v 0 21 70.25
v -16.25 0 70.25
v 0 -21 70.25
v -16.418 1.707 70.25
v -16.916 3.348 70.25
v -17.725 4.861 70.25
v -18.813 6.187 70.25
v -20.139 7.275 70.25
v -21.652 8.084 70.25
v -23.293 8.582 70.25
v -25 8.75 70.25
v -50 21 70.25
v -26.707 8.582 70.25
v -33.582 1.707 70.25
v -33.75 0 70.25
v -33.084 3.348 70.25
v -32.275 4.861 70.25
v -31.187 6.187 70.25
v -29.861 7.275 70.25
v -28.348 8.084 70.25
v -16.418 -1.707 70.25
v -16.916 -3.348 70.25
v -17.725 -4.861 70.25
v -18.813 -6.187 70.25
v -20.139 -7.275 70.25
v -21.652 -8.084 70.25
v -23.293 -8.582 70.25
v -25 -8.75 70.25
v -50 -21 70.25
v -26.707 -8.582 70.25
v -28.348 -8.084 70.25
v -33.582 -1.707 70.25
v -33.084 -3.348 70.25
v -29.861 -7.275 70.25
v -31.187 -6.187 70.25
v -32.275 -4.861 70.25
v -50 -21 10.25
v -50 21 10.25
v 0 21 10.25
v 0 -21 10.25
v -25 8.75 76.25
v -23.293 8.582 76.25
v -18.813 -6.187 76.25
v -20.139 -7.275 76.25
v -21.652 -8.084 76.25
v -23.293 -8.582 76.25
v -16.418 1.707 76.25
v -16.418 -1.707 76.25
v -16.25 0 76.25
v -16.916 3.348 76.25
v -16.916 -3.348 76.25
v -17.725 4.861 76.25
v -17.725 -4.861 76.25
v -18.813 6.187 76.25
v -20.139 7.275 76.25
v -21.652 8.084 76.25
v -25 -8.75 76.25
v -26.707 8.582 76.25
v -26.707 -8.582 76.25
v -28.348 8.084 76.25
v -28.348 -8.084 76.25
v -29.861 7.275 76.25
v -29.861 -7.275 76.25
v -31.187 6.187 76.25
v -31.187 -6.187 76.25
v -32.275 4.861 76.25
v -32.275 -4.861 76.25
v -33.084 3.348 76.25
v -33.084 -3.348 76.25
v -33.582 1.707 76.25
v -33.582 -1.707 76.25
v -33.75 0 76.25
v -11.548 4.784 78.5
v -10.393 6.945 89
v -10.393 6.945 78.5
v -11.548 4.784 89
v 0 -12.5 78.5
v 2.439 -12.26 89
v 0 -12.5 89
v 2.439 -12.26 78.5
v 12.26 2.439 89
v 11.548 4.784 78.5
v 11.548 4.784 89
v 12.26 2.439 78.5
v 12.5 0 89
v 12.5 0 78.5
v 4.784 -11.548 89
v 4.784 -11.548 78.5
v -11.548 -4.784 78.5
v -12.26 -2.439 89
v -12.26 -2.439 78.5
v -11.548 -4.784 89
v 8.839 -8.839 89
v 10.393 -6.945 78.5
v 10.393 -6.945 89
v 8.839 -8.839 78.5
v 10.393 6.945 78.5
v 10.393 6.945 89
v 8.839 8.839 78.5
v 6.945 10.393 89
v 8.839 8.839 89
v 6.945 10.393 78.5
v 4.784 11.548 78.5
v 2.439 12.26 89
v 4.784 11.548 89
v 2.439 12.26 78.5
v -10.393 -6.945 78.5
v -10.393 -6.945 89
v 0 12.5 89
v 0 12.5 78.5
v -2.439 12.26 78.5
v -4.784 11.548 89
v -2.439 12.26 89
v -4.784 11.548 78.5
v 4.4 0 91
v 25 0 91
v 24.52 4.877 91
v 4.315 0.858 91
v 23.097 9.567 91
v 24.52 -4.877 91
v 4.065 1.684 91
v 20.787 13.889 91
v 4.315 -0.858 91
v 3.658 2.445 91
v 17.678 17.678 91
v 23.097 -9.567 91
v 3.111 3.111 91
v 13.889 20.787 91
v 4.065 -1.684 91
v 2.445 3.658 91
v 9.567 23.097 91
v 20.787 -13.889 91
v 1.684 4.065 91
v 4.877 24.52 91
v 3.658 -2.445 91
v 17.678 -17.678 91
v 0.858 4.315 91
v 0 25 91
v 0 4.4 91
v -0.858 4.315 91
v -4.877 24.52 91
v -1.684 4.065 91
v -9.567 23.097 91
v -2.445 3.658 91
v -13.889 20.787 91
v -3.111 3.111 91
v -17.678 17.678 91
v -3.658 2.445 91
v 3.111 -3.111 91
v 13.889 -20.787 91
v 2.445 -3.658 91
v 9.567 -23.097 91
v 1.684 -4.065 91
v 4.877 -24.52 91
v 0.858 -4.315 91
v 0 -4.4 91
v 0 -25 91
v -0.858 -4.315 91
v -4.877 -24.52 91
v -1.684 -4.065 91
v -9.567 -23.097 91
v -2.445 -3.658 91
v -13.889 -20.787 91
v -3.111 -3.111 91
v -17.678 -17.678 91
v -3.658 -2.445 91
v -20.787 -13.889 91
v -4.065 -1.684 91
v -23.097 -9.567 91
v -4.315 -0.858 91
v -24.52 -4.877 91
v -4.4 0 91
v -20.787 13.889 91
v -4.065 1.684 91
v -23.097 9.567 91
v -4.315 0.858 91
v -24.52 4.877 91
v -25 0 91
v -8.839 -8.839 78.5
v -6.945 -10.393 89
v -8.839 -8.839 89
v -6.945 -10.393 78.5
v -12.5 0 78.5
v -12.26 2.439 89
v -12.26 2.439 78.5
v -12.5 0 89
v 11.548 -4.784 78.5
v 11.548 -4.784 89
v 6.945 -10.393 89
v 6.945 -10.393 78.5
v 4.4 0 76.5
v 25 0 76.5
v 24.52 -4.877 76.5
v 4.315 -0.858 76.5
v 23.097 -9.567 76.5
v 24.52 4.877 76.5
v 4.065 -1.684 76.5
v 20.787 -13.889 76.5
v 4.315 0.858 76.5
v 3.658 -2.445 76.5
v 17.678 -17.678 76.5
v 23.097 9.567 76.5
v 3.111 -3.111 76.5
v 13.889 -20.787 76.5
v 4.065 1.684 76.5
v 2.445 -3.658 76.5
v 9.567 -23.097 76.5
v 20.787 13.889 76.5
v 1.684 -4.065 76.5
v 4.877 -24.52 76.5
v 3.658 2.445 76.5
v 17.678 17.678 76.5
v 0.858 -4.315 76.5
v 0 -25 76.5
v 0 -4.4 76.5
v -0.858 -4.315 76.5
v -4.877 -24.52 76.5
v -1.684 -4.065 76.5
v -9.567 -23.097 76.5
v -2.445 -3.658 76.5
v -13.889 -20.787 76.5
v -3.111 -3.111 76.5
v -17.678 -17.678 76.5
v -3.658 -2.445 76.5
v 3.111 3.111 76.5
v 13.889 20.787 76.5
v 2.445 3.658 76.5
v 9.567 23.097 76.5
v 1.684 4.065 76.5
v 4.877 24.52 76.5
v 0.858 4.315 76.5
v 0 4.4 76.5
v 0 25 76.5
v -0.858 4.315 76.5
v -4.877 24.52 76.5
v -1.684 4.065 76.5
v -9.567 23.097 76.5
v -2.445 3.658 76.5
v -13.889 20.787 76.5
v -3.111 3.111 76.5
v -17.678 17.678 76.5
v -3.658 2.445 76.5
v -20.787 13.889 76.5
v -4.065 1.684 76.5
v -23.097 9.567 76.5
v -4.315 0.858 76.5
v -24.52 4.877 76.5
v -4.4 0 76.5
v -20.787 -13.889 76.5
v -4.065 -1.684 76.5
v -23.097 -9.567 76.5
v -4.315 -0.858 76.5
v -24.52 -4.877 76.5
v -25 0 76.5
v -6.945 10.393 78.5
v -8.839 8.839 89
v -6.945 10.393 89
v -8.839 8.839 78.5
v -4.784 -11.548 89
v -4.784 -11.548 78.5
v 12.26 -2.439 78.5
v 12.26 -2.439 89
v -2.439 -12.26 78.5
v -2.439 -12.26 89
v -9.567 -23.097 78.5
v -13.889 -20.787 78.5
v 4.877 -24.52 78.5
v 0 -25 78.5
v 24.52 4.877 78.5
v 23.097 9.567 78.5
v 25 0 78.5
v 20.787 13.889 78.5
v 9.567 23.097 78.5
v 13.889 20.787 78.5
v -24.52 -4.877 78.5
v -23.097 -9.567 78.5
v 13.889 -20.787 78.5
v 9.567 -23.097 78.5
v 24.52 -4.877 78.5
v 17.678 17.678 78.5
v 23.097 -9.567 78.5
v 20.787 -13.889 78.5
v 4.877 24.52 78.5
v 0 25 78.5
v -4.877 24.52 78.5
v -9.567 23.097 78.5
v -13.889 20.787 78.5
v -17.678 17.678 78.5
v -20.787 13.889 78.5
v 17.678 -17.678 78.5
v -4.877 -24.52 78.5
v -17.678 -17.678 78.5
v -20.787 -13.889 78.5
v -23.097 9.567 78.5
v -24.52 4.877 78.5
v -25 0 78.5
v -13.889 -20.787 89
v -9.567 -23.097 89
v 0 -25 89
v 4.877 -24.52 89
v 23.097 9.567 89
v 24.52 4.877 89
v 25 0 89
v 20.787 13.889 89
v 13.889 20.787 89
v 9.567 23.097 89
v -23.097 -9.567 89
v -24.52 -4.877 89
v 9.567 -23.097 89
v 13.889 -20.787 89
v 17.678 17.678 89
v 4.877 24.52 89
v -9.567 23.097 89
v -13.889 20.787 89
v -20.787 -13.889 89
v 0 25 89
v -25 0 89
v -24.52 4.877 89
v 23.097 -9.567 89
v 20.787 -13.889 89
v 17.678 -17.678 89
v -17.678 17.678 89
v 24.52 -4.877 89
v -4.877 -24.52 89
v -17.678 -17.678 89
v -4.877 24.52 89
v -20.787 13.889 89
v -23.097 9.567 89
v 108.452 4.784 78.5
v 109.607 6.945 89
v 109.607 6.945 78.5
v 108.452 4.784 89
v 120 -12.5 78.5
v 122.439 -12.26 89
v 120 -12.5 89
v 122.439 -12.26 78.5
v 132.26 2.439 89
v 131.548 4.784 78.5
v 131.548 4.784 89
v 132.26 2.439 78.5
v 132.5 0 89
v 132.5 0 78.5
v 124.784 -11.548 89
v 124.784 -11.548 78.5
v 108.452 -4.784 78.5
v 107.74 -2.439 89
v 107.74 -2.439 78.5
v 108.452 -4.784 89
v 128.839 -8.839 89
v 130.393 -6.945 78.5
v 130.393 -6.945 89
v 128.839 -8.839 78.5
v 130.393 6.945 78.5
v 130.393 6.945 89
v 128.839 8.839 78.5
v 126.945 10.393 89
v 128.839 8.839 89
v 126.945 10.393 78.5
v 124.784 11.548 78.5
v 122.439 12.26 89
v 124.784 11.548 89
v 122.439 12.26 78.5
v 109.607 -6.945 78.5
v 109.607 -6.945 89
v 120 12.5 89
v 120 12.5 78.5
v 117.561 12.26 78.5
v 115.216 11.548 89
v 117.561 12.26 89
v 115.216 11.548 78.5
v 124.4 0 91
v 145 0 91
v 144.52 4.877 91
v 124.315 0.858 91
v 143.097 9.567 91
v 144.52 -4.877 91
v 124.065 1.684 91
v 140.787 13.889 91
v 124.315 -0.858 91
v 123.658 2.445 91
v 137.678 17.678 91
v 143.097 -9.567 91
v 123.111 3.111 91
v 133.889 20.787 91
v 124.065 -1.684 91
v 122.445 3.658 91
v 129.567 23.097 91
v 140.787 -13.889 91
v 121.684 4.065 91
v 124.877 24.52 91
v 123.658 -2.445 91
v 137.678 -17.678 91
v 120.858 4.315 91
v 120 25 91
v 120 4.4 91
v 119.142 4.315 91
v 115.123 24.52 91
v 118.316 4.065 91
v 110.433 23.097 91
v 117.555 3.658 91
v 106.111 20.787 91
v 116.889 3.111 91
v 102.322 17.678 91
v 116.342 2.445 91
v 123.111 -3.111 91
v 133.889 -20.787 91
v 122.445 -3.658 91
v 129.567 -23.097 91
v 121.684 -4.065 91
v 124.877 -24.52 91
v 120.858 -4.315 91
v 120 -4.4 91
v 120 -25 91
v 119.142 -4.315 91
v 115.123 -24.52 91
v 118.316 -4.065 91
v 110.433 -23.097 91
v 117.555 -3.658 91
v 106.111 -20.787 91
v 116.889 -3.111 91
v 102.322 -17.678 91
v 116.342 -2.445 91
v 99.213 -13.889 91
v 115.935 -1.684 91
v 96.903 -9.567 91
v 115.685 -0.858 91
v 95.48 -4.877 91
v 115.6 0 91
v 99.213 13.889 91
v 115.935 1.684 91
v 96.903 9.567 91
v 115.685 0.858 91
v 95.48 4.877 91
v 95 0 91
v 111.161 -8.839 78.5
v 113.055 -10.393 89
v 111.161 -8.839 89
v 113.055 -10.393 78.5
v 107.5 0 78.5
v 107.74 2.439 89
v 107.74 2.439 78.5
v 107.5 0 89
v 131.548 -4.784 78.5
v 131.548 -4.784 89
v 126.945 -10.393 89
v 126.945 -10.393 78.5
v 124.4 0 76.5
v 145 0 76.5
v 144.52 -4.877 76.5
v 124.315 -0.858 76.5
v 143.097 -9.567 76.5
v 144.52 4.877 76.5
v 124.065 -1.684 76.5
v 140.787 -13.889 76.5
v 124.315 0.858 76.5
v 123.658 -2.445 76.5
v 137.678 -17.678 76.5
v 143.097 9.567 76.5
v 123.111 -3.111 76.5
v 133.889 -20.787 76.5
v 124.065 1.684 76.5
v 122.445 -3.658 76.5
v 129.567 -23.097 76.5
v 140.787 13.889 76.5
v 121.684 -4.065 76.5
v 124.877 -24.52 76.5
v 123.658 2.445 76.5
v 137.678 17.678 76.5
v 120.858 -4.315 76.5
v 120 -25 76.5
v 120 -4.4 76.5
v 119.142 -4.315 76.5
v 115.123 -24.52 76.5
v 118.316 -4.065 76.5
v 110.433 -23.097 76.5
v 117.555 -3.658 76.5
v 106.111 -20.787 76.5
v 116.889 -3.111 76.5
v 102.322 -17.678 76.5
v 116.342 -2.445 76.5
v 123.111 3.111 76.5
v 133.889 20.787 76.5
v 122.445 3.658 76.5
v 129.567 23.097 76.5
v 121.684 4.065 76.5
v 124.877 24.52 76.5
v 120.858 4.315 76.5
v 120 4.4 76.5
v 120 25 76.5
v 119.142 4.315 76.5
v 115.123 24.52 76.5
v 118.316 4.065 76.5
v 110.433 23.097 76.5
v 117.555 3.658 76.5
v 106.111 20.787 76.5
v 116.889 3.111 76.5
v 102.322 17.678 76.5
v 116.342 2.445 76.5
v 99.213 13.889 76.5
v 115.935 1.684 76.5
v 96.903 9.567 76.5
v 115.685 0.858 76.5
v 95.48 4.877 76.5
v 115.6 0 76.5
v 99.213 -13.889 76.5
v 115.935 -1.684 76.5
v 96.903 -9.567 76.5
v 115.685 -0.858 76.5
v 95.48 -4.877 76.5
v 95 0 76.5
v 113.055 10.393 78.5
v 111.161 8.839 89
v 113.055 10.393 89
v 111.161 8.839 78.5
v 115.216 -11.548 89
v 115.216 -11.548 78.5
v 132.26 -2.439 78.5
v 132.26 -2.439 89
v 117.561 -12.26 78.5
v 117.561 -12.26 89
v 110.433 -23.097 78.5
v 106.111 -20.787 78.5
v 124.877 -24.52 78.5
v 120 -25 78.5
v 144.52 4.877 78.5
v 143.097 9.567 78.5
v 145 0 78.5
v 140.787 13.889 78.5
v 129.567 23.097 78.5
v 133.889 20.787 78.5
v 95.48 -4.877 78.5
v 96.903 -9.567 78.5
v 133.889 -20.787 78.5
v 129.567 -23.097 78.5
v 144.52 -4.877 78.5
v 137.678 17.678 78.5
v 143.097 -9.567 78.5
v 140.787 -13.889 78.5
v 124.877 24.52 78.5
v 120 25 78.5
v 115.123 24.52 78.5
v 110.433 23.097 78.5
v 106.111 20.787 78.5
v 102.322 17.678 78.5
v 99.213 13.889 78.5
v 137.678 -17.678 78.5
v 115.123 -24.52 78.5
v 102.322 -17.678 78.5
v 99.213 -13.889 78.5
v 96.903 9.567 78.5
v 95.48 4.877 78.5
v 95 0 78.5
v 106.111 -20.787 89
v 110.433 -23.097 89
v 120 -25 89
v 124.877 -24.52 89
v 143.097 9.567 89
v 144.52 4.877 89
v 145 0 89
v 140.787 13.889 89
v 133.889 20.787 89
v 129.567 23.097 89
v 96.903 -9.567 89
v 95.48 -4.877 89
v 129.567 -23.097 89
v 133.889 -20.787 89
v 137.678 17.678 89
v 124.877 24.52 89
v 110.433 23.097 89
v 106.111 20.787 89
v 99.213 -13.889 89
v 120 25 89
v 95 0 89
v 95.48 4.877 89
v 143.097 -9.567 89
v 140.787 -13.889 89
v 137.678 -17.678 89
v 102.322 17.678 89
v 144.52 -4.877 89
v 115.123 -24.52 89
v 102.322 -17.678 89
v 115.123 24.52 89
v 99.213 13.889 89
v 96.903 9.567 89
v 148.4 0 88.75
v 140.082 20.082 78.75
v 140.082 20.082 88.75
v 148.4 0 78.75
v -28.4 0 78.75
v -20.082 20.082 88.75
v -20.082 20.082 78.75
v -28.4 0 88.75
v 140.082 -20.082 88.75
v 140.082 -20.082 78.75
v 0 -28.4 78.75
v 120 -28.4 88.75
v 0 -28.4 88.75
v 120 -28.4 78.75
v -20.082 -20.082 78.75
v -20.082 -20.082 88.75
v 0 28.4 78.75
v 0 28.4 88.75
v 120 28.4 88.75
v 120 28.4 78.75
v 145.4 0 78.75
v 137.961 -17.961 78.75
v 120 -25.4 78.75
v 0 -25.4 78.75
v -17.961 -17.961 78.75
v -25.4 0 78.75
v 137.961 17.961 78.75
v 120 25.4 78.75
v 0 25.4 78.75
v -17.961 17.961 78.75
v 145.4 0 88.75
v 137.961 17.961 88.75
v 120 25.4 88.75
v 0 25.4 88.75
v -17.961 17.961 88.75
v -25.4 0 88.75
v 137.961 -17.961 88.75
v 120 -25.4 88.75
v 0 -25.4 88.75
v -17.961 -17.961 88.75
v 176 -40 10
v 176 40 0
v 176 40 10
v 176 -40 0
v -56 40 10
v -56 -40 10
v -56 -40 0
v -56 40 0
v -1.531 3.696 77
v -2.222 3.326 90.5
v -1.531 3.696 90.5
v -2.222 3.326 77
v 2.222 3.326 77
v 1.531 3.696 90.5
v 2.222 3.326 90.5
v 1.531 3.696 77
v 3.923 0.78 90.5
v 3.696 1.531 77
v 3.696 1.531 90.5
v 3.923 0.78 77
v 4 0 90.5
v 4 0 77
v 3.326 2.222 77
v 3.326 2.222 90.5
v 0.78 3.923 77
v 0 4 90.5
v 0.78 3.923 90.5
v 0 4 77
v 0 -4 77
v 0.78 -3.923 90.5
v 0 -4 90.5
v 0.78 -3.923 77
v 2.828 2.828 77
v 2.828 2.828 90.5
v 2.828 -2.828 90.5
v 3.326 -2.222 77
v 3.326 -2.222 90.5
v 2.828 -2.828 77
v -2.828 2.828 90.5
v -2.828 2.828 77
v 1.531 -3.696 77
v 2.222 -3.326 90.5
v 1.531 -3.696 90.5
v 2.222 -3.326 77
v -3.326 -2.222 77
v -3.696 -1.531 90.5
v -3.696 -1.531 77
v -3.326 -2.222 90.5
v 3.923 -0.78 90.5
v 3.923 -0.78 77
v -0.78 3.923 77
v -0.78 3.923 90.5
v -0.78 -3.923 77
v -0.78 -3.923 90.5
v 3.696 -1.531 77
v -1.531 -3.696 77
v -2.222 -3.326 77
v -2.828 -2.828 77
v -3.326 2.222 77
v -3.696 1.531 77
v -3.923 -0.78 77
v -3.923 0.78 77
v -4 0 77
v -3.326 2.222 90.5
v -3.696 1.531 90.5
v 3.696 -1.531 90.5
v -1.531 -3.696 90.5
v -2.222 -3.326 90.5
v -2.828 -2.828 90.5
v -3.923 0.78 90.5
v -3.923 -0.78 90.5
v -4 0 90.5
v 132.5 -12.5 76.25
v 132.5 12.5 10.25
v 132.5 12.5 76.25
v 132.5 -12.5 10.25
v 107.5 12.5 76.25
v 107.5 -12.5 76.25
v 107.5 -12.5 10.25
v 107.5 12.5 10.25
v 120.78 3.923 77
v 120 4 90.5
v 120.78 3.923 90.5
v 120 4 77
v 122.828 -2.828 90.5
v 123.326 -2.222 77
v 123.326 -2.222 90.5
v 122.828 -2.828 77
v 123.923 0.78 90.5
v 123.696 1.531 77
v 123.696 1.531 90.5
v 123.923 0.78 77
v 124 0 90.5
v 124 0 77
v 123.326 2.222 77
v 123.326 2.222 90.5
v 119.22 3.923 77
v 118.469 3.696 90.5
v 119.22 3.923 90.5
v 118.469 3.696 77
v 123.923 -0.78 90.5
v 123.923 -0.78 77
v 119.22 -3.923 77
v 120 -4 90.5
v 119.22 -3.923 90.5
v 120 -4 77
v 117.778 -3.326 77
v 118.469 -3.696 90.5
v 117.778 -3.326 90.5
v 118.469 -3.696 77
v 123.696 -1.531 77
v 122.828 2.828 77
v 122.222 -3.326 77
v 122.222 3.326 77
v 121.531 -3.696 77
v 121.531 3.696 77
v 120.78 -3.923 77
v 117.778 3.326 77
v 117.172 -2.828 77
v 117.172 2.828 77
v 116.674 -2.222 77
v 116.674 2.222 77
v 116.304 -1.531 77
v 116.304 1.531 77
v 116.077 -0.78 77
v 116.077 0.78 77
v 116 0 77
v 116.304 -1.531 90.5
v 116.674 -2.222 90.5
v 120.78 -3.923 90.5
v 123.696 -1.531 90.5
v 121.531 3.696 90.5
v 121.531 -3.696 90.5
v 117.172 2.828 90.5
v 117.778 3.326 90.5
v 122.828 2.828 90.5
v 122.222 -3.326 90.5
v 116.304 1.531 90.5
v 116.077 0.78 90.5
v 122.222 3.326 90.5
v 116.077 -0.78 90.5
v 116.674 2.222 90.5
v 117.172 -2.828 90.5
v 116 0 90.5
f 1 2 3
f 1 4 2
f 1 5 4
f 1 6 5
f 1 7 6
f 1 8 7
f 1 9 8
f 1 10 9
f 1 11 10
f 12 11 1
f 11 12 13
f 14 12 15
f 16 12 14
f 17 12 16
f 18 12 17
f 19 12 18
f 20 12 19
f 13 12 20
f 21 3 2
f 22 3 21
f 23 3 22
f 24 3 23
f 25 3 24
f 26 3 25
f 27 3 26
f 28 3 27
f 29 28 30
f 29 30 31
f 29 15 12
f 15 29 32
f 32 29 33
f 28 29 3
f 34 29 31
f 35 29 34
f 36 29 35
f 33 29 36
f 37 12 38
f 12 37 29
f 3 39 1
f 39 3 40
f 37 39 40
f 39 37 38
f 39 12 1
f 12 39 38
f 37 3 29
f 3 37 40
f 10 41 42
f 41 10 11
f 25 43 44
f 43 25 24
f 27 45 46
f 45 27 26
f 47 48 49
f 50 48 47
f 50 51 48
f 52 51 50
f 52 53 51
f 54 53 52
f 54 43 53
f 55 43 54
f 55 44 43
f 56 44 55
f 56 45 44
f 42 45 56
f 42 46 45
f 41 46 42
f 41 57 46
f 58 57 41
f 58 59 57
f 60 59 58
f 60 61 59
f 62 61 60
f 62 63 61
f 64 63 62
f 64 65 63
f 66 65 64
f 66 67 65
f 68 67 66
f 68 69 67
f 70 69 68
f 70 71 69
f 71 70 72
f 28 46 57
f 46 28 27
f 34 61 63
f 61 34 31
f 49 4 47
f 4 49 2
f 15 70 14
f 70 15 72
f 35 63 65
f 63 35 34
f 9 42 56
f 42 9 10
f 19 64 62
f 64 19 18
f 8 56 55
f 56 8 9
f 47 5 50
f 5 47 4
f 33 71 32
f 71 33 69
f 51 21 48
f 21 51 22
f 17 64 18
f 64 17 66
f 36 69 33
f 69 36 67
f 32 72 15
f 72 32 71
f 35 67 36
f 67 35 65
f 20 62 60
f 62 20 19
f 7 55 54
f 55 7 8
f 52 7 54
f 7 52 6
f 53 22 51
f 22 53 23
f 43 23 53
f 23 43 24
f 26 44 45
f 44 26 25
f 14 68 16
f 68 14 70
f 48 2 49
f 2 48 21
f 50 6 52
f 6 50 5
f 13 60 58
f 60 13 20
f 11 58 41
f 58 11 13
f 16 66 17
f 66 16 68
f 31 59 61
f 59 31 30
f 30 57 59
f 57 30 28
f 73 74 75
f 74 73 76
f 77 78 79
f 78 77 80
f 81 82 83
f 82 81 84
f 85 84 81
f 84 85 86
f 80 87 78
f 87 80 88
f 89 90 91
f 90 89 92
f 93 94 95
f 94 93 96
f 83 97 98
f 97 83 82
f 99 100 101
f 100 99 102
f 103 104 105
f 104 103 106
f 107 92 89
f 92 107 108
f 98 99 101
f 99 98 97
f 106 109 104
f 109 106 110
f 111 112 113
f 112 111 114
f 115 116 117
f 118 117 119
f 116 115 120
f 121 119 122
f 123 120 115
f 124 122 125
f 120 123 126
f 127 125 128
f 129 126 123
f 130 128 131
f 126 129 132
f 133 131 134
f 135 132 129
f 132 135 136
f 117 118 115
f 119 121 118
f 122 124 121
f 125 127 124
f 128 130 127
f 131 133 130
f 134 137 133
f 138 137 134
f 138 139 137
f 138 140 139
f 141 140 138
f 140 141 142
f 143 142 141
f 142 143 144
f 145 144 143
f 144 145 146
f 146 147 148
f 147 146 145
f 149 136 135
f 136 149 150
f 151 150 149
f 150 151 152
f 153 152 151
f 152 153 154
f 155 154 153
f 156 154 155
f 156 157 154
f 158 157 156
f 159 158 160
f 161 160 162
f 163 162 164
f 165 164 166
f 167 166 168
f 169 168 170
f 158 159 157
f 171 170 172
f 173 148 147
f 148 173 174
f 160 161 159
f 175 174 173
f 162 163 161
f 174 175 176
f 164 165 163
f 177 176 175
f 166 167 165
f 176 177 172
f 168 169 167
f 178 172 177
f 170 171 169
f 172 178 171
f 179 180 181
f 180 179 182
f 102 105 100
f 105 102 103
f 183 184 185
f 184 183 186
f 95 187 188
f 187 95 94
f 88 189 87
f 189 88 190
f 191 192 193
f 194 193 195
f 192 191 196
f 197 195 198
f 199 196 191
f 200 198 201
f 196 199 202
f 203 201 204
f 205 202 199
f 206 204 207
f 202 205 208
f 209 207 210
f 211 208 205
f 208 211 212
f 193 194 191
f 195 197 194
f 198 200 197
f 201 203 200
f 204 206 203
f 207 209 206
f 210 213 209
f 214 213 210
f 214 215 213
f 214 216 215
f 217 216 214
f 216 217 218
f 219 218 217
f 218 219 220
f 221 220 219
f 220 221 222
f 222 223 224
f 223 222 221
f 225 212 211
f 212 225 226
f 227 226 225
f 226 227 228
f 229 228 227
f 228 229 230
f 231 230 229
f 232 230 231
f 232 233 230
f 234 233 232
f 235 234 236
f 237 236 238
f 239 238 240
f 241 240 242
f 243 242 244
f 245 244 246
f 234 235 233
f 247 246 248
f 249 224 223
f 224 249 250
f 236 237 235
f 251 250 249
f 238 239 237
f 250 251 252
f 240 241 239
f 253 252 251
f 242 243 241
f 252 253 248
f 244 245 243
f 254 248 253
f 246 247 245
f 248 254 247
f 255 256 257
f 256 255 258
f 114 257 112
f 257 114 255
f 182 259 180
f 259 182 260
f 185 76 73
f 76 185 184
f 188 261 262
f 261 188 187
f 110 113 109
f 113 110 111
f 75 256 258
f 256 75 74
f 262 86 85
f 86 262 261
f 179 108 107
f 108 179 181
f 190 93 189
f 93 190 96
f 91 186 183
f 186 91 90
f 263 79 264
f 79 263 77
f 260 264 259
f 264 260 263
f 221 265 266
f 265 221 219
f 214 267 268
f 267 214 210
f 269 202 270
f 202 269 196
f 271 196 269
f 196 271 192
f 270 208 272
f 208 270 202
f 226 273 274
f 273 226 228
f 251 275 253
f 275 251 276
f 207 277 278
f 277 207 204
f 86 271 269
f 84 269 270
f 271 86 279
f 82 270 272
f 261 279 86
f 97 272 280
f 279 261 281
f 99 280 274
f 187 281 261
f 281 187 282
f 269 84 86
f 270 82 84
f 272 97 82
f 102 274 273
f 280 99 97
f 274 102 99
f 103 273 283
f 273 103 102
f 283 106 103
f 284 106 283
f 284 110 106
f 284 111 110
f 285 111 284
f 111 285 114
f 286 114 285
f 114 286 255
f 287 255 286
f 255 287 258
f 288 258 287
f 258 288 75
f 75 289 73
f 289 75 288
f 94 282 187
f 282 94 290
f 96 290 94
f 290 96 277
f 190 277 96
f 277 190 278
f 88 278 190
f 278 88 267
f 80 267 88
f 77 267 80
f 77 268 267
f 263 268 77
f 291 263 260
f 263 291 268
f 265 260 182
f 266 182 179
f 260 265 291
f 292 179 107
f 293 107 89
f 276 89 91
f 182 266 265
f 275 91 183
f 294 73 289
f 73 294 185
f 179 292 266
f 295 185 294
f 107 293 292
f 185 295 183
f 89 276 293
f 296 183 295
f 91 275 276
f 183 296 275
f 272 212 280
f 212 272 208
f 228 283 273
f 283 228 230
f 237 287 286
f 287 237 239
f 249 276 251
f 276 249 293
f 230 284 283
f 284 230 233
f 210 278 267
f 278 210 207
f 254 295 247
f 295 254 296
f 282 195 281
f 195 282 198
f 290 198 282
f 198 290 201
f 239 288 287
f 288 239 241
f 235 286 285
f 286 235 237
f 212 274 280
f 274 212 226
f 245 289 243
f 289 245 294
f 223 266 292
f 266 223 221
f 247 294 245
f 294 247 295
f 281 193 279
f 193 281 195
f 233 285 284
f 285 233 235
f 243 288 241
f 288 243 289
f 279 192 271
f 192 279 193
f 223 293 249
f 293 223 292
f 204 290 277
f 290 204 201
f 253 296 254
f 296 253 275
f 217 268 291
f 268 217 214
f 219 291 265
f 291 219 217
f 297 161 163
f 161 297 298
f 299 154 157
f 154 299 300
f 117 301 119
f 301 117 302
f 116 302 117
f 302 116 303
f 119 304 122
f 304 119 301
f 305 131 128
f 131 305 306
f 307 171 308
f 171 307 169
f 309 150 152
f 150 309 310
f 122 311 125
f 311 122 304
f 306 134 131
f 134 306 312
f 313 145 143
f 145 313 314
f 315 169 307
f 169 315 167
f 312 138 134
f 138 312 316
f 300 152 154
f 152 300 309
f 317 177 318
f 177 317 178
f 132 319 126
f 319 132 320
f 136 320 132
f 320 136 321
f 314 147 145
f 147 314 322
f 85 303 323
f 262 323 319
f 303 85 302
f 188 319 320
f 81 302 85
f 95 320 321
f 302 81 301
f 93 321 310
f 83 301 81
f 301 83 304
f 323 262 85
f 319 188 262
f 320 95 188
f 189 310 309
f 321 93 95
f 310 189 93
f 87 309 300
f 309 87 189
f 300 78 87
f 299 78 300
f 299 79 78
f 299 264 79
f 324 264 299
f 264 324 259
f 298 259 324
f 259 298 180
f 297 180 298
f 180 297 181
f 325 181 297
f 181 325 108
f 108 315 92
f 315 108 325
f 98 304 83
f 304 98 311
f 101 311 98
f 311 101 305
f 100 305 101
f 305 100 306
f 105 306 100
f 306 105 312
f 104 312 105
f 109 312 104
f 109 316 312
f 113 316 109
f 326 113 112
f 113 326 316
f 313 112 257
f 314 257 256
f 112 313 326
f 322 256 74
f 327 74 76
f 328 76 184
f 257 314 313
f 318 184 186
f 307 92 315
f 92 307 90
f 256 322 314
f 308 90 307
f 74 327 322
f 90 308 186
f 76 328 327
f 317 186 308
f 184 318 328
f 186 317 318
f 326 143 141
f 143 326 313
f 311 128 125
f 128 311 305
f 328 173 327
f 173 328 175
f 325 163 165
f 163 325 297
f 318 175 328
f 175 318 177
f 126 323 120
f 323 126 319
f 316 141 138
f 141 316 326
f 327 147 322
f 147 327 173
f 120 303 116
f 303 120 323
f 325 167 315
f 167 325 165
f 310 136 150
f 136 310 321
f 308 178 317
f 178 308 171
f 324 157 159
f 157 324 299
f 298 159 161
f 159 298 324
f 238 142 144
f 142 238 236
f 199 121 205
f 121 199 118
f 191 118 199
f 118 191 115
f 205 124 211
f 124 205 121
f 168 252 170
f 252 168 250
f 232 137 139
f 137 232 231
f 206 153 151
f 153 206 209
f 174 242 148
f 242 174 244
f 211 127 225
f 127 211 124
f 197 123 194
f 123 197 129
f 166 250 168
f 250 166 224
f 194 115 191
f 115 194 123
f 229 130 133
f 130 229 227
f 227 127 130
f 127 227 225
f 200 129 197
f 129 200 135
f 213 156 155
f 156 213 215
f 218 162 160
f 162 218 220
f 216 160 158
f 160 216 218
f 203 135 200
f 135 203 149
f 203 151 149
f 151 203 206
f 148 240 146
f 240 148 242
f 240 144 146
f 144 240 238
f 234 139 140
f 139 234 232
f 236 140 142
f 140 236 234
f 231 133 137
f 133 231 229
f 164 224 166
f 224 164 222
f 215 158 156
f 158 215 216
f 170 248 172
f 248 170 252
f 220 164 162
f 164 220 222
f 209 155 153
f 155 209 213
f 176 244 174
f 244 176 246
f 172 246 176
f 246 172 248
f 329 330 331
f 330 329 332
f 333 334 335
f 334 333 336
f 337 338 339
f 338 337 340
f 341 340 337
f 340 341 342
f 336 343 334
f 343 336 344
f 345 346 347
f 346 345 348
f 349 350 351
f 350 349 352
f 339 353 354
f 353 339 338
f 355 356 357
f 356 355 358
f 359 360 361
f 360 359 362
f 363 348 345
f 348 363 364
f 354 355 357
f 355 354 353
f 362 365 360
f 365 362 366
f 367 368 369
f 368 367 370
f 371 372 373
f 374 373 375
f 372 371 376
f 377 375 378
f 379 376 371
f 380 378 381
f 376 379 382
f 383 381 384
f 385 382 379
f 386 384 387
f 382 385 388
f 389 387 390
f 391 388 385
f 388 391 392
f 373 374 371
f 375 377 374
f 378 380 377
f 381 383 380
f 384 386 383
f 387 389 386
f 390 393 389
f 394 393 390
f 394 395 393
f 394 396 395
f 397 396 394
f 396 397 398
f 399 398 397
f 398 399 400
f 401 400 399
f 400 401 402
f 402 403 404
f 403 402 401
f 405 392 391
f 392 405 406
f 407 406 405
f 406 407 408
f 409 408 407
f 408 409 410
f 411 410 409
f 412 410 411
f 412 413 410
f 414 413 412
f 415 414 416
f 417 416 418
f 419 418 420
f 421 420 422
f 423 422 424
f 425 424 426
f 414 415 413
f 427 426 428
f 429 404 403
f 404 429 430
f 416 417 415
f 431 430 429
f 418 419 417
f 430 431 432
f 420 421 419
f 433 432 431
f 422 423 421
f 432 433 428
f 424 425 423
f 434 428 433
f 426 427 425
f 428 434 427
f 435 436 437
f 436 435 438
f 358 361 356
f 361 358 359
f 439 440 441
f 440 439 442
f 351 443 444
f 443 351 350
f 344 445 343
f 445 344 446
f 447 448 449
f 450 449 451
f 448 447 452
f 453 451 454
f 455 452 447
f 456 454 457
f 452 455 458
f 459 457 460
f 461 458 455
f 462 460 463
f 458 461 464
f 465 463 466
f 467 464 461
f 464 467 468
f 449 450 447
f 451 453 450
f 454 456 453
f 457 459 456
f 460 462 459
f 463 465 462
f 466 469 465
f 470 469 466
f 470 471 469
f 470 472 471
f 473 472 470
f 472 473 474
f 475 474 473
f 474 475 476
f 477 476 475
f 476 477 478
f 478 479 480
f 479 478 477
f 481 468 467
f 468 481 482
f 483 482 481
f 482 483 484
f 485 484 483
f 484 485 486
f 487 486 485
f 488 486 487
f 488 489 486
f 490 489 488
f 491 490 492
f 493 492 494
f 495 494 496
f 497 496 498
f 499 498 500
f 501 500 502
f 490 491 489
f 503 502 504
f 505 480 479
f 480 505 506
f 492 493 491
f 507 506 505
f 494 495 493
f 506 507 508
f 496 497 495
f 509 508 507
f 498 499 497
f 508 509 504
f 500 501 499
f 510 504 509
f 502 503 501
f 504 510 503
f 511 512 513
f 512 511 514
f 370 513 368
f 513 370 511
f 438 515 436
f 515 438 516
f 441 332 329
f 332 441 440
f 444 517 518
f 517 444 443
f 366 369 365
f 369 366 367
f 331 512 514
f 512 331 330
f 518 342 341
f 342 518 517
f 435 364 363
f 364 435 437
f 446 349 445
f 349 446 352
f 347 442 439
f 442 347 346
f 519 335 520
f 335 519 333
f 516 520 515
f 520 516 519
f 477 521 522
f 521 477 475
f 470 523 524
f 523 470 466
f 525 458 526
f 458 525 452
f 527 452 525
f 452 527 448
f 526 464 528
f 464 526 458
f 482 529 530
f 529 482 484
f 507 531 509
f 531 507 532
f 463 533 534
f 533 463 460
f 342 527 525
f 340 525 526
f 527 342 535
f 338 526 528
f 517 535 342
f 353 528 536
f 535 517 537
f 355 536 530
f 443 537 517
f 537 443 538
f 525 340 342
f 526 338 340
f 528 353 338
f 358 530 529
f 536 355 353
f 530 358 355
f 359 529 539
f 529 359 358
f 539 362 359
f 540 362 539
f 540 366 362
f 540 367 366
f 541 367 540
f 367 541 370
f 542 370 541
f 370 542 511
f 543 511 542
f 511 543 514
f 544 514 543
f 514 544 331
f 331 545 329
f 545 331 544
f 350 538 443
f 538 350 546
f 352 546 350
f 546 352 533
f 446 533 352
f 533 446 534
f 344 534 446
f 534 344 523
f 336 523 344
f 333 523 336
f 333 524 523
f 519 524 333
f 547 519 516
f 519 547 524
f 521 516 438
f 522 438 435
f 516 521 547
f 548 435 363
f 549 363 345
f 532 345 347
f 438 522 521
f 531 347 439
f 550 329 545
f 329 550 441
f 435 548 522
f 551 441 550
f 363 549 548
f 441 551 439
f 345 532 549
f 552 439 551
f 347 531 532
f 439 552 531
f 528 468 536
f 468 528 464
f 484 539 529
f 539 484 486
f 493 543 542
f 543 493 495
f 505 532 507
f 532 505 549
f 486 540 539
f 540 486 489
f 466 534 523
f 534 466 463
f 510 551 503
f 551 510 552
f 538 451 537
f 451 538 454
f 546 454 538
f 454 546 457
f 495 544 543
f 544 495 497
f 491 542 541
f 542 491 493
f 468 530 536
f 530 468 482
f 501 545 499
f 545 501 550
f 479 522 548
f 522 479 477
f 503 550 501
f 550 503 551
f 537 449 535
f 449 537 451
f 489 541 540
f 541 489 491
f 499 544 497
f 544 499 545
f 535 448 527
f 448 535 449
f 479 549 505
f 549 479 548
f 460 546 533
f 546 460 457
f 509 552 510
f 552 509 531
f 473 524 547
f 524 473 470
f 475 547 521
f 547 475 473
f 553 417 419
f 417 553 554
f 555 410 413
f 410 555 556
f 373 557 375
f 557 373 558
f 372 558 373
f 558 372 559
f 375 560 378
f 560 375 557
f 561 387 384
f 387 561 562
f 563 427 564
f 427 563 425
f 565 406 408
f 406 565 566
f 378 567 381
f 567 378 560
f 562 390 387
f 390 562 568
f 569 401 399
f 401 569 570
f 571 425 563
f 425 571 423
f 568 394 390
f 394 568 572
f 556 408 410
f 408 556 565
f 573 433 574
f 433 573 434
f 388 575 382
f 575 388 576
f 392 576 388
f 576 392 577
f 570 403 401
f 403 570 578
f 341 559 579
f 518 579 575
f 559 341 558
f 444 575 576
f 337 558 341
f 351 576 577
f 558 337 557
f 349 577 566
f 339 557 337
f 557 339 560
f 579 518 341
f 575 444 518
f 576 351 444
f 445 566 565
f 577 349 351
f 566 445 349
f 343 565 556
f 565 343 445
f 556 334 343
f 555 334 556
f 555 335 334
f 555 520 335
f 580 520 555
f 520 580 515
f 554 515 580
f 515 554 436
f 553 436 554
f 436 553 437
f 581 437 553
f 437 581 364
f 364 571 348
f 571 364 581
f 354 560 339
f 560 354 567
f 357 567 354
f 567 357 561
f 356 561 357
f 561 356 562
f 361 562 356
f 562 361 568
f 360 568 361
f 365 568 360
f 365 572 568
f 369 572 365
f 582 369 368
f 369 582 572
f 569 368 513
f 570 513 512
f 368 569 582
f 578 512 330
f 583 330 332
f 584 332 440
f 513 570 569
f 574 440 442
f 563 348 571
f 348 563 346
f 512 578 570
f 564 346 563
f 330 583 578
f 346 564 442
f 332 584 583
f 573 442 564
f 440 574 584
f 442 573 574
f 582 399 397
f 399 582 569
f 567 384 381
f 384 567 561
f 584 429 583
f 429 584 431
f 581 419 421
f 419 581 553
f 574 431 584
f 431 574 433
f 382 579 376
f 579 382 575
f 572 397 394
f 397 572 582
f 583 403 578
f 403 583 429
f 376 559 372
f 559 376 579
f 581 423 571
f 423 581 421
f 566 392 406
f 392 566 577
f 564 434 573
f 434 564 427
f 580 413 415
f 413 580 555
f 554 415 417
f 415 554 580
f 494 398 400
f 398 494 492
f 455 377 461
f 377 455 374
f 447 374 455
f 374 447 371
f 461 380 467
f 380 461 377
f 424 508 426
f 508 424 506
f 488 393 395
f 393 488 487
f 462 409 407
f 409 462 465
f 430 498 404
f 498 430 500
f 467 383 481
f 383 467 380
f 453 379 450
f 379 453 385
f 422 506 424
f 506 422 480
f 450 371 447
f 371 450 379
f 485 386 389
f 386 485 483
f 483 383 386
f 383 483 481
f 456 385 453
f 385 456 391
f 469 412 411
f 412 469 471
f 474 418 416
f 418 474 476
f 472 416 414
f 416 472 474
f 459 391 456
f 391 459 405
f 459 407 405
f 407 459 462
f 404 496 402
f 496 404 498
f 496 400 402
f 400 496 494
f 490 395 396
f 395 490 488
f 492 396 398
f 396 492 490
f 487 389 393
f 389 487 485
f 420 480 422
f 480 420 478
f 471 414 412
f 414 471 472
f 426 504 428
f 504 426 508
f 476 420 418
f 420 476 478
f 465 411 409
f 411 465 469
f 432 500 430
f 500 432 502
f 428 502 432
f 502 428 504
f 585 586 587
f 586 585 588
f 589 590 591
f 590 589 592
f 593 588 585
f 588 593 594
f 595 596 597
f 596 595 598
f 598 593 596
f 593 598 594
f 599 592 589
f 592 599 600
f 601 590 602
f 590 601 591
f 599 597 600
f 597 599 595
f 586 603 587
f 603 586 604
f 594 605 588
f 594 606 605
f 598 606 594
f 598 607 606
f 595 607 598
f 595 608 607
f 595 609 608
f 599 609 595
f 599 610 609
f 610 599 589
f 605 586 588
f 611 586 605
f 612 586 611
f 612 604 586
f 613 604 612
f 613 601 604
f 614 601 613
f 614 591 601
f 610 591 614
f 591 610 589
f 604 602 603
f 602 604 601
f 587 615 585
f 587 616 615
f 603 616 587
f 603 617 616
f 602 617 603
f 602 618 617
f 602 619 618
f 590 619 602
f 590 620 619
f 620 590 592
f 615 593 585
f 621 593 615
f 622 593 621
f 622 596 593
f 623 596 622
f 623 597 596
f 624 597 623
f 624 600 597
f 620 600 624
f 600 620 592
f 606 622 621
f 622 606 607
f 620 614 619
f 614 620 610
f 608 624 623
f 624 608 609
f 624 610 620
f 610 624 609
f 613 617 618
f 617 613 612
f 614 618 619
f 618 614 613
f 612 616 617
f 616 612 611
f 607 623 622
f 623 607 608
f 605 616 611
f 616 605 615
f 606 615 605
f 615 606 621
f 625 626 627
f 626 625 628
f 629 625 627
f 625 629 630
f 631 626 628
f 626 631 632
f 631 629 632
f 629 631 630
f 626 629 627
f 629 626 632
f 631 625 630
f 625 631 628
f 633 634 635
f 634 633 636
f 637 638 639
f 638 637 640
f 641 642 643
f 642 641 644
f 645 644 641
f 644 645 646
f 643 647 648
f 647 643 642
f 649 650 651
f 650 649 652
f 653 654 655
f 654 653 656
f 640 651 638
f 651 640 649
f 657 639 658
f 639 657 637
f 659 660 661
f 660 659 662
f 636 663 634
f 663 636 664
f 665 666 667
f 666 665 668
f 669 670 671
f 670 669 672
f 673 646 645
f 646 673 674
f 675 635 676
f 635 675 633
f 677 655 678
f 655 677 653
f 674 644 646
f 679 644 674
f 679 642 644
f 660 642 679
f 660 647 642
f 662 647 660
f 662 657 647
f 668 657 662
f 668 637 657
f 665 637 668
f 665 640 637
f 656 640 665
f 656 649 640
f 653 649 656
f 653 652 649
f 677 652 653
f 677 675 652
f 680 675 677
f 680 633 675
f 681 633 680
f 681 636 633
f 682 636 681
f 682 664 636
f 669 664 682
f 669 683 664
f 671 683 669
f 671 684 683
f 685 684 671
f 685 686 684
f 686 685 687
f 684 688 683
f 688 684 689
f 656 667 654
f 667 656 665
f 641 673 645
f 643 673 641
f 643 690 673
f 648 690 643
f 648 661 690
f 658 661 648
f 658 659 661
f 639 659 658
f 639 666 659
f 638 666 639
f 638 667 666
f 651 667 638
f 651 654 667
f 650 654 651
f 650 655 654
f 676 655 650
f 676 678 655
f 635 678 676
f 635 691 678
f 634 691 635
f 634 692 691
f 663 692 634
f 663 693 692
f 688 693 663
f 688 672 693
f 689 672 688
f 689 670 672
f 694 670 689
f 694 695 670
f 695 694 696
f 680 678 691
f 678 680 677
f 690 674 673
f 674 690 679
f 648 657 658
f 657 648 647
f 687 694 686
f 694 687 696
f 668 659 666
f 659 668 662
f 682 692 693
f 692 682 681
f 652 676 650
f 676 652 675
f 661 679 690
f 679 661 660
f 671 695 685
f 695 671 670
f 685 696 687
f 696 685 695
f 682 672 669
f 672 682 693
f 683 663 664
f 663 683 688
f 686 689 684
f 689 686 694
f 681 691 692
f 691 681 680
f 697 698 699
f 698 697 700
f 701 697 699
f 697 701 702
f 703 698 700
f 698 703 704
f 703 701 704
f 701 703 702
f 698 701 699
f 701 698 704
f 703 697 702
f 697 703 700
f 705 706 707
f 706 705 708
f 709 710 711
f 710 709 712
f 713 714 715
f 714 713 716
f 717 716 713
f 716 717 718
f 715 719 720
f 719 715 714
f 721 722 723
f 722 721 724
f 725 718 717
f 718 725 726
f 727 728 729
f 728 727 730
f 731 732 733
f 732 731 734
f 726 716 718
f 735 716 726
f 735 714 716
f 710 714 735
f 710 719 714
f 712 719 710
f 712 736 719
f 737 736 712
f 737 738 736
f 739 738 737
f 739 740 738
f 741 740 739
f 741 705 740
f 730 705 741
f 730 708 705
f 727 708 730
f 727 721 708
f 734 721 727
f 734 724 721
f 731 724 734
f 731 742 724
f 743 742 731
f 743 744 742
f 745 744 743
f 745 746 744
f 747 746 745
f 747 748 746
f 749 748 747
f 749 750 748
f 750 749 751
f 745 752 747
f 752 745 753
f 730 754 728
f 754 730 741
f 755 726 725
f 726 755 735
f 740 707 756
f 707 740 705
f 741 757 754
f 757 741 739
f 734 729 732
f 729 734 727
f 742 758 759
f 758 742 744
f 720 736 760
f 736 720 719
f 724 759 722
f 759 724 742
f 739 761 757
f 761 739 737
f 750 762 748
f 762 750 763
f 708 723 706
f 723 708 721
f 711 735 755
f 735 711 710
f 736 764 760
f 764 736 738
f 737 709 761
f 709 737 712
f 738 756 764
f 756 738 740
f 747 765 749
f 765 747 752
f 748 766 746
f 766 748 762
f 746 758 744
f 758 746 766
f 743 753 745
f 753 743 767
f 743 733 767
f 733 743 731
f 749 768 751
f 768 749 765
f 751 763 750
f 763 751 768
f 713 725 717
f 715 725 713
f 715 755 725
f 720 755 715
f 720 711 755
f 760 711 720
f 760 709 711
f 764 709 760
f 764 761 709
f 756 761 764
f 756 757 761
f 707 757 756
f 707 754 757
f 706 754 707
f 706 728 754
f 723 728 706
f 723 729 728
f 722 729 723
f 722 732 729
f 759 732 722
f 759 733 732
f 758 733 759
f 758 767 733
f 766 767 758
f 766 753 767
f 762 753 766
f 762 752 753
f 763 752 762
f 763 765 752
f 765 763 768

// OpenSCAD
$fn = 32;

// ------------------------------------------------------------------------
// Motor belt drive: span 120 mm, pulleys d50, belt 10 mm wide
// Every part is its own module, assembly() places every instance.
// ------------------------------------------------------------------------

// --- part 1 ---
module base_plate() {
  difference() {
    translate([-116, -40, 0]) cube([232, 80, 10]);
  }
}

// --- part 2 ---
module motor() {
  union() {
    translate([-30, -21, 0]) cube([60, 42, 50]);
    translate([33, 0, 25]) rotate([0, 90, 0]) cylinder(h = 6, d = 17.5, center = true);
  }
}

// --- part 3 ---
module drive_shaft() {
  translate([0, 0, -6.75]) cylinder(h = 13.5, d = 8);
}

// --- part 4 ---
module pulley_drive() {
  difference() {
    union() {
      cylinder(h = 14.5, d = 25);
      cylinder(h = 2, d = 50);
      translate([0, 0, 12.5]) cylinder(h = 2, d = 50);
    }
    translate([0, 0, -1]) cylinder(h = 16.5, d = 8.8);
  }
}

// --- part 5 ---
module idler_post() {
  translate([-12.5, -12.5, 0]) cube([25, 25, 66]);
}

// --- part 6 ---
module driven_shaft() {
  translate([0, 0, -6.75]) cylinder(h = 13.5, d = 8);
}

// --- part 7 ---
module pulley_driven() {
  difference() {
    union() {
      cylinder(h = 14.5, d = 25);
      cylinder(h = 2, d = 50);
      translate([0, 0, 12.5]) cylinder(h = 2, d = 50);
    }
    translate([0, 0, -1]) cylinder(h = 16.5, d = 8.8);
  }
}

// --- part 8 ---
module drive_belt() {
  difference() {
    linear_extrude(height = 10) polygon(points = concat([for (a = [90 : 45 : 270]) [28.4 * cos(a), 28.4 * sin(a)]], [for (a = [270 : 45 : 450]) [120 + 28.4 * cos(a), 28.4 * sin(a)]]));
    translate([0, 0, -1]) linear_extrude(height = 12) polygon(points = concat([for (a = [90 : 45 : 270]) [25.4 * cos(a), 25.4 * sin(a)]], [for (a = [270 : 45 : 450]) [120 + 25.4 * cos(a), 25.4 * sin(a)]]));
  }
}

// --- assembly ---
module assembly() {
  color([0.80, 0.24, 0.20]) translate([60, 0, 0]) rotate([0, 0, 0]) base_plate();
  color([0.20, 0.45, 0.75]) translate([0, 0, 40.25]) rotate([0, 270, 0]) motor();
  color([0.25, 0.62, 0.32]) translate([0, 0, 83.75]) rotate([0, 0, 0]) drive_shaft();
  color([0.92, 0.70, 0.18]) translate([0, 0, 76.5]) rotate([0, 0, 0]) pulley_drive();
  color([0.58, 0.35, 0.70]) translate([120, 0, 10.25]) rotate([0, 0, 0]) idler_post();
  color([0.16, 0.66, 0.66]) translate([120, 0, 83.75]) rotate([0, 0, 0]) driven_shaft();
  color([0.85, 0.48, 0.18]) translate([120, 0, 76.5]) rotate([0, 0, 0]) pulley_driven();
  color([0.55, 0.60, 0.65]) translate([0, 0, 78.75]) rotate([0, 0, 0]) drive_belt();
}

assembly();
